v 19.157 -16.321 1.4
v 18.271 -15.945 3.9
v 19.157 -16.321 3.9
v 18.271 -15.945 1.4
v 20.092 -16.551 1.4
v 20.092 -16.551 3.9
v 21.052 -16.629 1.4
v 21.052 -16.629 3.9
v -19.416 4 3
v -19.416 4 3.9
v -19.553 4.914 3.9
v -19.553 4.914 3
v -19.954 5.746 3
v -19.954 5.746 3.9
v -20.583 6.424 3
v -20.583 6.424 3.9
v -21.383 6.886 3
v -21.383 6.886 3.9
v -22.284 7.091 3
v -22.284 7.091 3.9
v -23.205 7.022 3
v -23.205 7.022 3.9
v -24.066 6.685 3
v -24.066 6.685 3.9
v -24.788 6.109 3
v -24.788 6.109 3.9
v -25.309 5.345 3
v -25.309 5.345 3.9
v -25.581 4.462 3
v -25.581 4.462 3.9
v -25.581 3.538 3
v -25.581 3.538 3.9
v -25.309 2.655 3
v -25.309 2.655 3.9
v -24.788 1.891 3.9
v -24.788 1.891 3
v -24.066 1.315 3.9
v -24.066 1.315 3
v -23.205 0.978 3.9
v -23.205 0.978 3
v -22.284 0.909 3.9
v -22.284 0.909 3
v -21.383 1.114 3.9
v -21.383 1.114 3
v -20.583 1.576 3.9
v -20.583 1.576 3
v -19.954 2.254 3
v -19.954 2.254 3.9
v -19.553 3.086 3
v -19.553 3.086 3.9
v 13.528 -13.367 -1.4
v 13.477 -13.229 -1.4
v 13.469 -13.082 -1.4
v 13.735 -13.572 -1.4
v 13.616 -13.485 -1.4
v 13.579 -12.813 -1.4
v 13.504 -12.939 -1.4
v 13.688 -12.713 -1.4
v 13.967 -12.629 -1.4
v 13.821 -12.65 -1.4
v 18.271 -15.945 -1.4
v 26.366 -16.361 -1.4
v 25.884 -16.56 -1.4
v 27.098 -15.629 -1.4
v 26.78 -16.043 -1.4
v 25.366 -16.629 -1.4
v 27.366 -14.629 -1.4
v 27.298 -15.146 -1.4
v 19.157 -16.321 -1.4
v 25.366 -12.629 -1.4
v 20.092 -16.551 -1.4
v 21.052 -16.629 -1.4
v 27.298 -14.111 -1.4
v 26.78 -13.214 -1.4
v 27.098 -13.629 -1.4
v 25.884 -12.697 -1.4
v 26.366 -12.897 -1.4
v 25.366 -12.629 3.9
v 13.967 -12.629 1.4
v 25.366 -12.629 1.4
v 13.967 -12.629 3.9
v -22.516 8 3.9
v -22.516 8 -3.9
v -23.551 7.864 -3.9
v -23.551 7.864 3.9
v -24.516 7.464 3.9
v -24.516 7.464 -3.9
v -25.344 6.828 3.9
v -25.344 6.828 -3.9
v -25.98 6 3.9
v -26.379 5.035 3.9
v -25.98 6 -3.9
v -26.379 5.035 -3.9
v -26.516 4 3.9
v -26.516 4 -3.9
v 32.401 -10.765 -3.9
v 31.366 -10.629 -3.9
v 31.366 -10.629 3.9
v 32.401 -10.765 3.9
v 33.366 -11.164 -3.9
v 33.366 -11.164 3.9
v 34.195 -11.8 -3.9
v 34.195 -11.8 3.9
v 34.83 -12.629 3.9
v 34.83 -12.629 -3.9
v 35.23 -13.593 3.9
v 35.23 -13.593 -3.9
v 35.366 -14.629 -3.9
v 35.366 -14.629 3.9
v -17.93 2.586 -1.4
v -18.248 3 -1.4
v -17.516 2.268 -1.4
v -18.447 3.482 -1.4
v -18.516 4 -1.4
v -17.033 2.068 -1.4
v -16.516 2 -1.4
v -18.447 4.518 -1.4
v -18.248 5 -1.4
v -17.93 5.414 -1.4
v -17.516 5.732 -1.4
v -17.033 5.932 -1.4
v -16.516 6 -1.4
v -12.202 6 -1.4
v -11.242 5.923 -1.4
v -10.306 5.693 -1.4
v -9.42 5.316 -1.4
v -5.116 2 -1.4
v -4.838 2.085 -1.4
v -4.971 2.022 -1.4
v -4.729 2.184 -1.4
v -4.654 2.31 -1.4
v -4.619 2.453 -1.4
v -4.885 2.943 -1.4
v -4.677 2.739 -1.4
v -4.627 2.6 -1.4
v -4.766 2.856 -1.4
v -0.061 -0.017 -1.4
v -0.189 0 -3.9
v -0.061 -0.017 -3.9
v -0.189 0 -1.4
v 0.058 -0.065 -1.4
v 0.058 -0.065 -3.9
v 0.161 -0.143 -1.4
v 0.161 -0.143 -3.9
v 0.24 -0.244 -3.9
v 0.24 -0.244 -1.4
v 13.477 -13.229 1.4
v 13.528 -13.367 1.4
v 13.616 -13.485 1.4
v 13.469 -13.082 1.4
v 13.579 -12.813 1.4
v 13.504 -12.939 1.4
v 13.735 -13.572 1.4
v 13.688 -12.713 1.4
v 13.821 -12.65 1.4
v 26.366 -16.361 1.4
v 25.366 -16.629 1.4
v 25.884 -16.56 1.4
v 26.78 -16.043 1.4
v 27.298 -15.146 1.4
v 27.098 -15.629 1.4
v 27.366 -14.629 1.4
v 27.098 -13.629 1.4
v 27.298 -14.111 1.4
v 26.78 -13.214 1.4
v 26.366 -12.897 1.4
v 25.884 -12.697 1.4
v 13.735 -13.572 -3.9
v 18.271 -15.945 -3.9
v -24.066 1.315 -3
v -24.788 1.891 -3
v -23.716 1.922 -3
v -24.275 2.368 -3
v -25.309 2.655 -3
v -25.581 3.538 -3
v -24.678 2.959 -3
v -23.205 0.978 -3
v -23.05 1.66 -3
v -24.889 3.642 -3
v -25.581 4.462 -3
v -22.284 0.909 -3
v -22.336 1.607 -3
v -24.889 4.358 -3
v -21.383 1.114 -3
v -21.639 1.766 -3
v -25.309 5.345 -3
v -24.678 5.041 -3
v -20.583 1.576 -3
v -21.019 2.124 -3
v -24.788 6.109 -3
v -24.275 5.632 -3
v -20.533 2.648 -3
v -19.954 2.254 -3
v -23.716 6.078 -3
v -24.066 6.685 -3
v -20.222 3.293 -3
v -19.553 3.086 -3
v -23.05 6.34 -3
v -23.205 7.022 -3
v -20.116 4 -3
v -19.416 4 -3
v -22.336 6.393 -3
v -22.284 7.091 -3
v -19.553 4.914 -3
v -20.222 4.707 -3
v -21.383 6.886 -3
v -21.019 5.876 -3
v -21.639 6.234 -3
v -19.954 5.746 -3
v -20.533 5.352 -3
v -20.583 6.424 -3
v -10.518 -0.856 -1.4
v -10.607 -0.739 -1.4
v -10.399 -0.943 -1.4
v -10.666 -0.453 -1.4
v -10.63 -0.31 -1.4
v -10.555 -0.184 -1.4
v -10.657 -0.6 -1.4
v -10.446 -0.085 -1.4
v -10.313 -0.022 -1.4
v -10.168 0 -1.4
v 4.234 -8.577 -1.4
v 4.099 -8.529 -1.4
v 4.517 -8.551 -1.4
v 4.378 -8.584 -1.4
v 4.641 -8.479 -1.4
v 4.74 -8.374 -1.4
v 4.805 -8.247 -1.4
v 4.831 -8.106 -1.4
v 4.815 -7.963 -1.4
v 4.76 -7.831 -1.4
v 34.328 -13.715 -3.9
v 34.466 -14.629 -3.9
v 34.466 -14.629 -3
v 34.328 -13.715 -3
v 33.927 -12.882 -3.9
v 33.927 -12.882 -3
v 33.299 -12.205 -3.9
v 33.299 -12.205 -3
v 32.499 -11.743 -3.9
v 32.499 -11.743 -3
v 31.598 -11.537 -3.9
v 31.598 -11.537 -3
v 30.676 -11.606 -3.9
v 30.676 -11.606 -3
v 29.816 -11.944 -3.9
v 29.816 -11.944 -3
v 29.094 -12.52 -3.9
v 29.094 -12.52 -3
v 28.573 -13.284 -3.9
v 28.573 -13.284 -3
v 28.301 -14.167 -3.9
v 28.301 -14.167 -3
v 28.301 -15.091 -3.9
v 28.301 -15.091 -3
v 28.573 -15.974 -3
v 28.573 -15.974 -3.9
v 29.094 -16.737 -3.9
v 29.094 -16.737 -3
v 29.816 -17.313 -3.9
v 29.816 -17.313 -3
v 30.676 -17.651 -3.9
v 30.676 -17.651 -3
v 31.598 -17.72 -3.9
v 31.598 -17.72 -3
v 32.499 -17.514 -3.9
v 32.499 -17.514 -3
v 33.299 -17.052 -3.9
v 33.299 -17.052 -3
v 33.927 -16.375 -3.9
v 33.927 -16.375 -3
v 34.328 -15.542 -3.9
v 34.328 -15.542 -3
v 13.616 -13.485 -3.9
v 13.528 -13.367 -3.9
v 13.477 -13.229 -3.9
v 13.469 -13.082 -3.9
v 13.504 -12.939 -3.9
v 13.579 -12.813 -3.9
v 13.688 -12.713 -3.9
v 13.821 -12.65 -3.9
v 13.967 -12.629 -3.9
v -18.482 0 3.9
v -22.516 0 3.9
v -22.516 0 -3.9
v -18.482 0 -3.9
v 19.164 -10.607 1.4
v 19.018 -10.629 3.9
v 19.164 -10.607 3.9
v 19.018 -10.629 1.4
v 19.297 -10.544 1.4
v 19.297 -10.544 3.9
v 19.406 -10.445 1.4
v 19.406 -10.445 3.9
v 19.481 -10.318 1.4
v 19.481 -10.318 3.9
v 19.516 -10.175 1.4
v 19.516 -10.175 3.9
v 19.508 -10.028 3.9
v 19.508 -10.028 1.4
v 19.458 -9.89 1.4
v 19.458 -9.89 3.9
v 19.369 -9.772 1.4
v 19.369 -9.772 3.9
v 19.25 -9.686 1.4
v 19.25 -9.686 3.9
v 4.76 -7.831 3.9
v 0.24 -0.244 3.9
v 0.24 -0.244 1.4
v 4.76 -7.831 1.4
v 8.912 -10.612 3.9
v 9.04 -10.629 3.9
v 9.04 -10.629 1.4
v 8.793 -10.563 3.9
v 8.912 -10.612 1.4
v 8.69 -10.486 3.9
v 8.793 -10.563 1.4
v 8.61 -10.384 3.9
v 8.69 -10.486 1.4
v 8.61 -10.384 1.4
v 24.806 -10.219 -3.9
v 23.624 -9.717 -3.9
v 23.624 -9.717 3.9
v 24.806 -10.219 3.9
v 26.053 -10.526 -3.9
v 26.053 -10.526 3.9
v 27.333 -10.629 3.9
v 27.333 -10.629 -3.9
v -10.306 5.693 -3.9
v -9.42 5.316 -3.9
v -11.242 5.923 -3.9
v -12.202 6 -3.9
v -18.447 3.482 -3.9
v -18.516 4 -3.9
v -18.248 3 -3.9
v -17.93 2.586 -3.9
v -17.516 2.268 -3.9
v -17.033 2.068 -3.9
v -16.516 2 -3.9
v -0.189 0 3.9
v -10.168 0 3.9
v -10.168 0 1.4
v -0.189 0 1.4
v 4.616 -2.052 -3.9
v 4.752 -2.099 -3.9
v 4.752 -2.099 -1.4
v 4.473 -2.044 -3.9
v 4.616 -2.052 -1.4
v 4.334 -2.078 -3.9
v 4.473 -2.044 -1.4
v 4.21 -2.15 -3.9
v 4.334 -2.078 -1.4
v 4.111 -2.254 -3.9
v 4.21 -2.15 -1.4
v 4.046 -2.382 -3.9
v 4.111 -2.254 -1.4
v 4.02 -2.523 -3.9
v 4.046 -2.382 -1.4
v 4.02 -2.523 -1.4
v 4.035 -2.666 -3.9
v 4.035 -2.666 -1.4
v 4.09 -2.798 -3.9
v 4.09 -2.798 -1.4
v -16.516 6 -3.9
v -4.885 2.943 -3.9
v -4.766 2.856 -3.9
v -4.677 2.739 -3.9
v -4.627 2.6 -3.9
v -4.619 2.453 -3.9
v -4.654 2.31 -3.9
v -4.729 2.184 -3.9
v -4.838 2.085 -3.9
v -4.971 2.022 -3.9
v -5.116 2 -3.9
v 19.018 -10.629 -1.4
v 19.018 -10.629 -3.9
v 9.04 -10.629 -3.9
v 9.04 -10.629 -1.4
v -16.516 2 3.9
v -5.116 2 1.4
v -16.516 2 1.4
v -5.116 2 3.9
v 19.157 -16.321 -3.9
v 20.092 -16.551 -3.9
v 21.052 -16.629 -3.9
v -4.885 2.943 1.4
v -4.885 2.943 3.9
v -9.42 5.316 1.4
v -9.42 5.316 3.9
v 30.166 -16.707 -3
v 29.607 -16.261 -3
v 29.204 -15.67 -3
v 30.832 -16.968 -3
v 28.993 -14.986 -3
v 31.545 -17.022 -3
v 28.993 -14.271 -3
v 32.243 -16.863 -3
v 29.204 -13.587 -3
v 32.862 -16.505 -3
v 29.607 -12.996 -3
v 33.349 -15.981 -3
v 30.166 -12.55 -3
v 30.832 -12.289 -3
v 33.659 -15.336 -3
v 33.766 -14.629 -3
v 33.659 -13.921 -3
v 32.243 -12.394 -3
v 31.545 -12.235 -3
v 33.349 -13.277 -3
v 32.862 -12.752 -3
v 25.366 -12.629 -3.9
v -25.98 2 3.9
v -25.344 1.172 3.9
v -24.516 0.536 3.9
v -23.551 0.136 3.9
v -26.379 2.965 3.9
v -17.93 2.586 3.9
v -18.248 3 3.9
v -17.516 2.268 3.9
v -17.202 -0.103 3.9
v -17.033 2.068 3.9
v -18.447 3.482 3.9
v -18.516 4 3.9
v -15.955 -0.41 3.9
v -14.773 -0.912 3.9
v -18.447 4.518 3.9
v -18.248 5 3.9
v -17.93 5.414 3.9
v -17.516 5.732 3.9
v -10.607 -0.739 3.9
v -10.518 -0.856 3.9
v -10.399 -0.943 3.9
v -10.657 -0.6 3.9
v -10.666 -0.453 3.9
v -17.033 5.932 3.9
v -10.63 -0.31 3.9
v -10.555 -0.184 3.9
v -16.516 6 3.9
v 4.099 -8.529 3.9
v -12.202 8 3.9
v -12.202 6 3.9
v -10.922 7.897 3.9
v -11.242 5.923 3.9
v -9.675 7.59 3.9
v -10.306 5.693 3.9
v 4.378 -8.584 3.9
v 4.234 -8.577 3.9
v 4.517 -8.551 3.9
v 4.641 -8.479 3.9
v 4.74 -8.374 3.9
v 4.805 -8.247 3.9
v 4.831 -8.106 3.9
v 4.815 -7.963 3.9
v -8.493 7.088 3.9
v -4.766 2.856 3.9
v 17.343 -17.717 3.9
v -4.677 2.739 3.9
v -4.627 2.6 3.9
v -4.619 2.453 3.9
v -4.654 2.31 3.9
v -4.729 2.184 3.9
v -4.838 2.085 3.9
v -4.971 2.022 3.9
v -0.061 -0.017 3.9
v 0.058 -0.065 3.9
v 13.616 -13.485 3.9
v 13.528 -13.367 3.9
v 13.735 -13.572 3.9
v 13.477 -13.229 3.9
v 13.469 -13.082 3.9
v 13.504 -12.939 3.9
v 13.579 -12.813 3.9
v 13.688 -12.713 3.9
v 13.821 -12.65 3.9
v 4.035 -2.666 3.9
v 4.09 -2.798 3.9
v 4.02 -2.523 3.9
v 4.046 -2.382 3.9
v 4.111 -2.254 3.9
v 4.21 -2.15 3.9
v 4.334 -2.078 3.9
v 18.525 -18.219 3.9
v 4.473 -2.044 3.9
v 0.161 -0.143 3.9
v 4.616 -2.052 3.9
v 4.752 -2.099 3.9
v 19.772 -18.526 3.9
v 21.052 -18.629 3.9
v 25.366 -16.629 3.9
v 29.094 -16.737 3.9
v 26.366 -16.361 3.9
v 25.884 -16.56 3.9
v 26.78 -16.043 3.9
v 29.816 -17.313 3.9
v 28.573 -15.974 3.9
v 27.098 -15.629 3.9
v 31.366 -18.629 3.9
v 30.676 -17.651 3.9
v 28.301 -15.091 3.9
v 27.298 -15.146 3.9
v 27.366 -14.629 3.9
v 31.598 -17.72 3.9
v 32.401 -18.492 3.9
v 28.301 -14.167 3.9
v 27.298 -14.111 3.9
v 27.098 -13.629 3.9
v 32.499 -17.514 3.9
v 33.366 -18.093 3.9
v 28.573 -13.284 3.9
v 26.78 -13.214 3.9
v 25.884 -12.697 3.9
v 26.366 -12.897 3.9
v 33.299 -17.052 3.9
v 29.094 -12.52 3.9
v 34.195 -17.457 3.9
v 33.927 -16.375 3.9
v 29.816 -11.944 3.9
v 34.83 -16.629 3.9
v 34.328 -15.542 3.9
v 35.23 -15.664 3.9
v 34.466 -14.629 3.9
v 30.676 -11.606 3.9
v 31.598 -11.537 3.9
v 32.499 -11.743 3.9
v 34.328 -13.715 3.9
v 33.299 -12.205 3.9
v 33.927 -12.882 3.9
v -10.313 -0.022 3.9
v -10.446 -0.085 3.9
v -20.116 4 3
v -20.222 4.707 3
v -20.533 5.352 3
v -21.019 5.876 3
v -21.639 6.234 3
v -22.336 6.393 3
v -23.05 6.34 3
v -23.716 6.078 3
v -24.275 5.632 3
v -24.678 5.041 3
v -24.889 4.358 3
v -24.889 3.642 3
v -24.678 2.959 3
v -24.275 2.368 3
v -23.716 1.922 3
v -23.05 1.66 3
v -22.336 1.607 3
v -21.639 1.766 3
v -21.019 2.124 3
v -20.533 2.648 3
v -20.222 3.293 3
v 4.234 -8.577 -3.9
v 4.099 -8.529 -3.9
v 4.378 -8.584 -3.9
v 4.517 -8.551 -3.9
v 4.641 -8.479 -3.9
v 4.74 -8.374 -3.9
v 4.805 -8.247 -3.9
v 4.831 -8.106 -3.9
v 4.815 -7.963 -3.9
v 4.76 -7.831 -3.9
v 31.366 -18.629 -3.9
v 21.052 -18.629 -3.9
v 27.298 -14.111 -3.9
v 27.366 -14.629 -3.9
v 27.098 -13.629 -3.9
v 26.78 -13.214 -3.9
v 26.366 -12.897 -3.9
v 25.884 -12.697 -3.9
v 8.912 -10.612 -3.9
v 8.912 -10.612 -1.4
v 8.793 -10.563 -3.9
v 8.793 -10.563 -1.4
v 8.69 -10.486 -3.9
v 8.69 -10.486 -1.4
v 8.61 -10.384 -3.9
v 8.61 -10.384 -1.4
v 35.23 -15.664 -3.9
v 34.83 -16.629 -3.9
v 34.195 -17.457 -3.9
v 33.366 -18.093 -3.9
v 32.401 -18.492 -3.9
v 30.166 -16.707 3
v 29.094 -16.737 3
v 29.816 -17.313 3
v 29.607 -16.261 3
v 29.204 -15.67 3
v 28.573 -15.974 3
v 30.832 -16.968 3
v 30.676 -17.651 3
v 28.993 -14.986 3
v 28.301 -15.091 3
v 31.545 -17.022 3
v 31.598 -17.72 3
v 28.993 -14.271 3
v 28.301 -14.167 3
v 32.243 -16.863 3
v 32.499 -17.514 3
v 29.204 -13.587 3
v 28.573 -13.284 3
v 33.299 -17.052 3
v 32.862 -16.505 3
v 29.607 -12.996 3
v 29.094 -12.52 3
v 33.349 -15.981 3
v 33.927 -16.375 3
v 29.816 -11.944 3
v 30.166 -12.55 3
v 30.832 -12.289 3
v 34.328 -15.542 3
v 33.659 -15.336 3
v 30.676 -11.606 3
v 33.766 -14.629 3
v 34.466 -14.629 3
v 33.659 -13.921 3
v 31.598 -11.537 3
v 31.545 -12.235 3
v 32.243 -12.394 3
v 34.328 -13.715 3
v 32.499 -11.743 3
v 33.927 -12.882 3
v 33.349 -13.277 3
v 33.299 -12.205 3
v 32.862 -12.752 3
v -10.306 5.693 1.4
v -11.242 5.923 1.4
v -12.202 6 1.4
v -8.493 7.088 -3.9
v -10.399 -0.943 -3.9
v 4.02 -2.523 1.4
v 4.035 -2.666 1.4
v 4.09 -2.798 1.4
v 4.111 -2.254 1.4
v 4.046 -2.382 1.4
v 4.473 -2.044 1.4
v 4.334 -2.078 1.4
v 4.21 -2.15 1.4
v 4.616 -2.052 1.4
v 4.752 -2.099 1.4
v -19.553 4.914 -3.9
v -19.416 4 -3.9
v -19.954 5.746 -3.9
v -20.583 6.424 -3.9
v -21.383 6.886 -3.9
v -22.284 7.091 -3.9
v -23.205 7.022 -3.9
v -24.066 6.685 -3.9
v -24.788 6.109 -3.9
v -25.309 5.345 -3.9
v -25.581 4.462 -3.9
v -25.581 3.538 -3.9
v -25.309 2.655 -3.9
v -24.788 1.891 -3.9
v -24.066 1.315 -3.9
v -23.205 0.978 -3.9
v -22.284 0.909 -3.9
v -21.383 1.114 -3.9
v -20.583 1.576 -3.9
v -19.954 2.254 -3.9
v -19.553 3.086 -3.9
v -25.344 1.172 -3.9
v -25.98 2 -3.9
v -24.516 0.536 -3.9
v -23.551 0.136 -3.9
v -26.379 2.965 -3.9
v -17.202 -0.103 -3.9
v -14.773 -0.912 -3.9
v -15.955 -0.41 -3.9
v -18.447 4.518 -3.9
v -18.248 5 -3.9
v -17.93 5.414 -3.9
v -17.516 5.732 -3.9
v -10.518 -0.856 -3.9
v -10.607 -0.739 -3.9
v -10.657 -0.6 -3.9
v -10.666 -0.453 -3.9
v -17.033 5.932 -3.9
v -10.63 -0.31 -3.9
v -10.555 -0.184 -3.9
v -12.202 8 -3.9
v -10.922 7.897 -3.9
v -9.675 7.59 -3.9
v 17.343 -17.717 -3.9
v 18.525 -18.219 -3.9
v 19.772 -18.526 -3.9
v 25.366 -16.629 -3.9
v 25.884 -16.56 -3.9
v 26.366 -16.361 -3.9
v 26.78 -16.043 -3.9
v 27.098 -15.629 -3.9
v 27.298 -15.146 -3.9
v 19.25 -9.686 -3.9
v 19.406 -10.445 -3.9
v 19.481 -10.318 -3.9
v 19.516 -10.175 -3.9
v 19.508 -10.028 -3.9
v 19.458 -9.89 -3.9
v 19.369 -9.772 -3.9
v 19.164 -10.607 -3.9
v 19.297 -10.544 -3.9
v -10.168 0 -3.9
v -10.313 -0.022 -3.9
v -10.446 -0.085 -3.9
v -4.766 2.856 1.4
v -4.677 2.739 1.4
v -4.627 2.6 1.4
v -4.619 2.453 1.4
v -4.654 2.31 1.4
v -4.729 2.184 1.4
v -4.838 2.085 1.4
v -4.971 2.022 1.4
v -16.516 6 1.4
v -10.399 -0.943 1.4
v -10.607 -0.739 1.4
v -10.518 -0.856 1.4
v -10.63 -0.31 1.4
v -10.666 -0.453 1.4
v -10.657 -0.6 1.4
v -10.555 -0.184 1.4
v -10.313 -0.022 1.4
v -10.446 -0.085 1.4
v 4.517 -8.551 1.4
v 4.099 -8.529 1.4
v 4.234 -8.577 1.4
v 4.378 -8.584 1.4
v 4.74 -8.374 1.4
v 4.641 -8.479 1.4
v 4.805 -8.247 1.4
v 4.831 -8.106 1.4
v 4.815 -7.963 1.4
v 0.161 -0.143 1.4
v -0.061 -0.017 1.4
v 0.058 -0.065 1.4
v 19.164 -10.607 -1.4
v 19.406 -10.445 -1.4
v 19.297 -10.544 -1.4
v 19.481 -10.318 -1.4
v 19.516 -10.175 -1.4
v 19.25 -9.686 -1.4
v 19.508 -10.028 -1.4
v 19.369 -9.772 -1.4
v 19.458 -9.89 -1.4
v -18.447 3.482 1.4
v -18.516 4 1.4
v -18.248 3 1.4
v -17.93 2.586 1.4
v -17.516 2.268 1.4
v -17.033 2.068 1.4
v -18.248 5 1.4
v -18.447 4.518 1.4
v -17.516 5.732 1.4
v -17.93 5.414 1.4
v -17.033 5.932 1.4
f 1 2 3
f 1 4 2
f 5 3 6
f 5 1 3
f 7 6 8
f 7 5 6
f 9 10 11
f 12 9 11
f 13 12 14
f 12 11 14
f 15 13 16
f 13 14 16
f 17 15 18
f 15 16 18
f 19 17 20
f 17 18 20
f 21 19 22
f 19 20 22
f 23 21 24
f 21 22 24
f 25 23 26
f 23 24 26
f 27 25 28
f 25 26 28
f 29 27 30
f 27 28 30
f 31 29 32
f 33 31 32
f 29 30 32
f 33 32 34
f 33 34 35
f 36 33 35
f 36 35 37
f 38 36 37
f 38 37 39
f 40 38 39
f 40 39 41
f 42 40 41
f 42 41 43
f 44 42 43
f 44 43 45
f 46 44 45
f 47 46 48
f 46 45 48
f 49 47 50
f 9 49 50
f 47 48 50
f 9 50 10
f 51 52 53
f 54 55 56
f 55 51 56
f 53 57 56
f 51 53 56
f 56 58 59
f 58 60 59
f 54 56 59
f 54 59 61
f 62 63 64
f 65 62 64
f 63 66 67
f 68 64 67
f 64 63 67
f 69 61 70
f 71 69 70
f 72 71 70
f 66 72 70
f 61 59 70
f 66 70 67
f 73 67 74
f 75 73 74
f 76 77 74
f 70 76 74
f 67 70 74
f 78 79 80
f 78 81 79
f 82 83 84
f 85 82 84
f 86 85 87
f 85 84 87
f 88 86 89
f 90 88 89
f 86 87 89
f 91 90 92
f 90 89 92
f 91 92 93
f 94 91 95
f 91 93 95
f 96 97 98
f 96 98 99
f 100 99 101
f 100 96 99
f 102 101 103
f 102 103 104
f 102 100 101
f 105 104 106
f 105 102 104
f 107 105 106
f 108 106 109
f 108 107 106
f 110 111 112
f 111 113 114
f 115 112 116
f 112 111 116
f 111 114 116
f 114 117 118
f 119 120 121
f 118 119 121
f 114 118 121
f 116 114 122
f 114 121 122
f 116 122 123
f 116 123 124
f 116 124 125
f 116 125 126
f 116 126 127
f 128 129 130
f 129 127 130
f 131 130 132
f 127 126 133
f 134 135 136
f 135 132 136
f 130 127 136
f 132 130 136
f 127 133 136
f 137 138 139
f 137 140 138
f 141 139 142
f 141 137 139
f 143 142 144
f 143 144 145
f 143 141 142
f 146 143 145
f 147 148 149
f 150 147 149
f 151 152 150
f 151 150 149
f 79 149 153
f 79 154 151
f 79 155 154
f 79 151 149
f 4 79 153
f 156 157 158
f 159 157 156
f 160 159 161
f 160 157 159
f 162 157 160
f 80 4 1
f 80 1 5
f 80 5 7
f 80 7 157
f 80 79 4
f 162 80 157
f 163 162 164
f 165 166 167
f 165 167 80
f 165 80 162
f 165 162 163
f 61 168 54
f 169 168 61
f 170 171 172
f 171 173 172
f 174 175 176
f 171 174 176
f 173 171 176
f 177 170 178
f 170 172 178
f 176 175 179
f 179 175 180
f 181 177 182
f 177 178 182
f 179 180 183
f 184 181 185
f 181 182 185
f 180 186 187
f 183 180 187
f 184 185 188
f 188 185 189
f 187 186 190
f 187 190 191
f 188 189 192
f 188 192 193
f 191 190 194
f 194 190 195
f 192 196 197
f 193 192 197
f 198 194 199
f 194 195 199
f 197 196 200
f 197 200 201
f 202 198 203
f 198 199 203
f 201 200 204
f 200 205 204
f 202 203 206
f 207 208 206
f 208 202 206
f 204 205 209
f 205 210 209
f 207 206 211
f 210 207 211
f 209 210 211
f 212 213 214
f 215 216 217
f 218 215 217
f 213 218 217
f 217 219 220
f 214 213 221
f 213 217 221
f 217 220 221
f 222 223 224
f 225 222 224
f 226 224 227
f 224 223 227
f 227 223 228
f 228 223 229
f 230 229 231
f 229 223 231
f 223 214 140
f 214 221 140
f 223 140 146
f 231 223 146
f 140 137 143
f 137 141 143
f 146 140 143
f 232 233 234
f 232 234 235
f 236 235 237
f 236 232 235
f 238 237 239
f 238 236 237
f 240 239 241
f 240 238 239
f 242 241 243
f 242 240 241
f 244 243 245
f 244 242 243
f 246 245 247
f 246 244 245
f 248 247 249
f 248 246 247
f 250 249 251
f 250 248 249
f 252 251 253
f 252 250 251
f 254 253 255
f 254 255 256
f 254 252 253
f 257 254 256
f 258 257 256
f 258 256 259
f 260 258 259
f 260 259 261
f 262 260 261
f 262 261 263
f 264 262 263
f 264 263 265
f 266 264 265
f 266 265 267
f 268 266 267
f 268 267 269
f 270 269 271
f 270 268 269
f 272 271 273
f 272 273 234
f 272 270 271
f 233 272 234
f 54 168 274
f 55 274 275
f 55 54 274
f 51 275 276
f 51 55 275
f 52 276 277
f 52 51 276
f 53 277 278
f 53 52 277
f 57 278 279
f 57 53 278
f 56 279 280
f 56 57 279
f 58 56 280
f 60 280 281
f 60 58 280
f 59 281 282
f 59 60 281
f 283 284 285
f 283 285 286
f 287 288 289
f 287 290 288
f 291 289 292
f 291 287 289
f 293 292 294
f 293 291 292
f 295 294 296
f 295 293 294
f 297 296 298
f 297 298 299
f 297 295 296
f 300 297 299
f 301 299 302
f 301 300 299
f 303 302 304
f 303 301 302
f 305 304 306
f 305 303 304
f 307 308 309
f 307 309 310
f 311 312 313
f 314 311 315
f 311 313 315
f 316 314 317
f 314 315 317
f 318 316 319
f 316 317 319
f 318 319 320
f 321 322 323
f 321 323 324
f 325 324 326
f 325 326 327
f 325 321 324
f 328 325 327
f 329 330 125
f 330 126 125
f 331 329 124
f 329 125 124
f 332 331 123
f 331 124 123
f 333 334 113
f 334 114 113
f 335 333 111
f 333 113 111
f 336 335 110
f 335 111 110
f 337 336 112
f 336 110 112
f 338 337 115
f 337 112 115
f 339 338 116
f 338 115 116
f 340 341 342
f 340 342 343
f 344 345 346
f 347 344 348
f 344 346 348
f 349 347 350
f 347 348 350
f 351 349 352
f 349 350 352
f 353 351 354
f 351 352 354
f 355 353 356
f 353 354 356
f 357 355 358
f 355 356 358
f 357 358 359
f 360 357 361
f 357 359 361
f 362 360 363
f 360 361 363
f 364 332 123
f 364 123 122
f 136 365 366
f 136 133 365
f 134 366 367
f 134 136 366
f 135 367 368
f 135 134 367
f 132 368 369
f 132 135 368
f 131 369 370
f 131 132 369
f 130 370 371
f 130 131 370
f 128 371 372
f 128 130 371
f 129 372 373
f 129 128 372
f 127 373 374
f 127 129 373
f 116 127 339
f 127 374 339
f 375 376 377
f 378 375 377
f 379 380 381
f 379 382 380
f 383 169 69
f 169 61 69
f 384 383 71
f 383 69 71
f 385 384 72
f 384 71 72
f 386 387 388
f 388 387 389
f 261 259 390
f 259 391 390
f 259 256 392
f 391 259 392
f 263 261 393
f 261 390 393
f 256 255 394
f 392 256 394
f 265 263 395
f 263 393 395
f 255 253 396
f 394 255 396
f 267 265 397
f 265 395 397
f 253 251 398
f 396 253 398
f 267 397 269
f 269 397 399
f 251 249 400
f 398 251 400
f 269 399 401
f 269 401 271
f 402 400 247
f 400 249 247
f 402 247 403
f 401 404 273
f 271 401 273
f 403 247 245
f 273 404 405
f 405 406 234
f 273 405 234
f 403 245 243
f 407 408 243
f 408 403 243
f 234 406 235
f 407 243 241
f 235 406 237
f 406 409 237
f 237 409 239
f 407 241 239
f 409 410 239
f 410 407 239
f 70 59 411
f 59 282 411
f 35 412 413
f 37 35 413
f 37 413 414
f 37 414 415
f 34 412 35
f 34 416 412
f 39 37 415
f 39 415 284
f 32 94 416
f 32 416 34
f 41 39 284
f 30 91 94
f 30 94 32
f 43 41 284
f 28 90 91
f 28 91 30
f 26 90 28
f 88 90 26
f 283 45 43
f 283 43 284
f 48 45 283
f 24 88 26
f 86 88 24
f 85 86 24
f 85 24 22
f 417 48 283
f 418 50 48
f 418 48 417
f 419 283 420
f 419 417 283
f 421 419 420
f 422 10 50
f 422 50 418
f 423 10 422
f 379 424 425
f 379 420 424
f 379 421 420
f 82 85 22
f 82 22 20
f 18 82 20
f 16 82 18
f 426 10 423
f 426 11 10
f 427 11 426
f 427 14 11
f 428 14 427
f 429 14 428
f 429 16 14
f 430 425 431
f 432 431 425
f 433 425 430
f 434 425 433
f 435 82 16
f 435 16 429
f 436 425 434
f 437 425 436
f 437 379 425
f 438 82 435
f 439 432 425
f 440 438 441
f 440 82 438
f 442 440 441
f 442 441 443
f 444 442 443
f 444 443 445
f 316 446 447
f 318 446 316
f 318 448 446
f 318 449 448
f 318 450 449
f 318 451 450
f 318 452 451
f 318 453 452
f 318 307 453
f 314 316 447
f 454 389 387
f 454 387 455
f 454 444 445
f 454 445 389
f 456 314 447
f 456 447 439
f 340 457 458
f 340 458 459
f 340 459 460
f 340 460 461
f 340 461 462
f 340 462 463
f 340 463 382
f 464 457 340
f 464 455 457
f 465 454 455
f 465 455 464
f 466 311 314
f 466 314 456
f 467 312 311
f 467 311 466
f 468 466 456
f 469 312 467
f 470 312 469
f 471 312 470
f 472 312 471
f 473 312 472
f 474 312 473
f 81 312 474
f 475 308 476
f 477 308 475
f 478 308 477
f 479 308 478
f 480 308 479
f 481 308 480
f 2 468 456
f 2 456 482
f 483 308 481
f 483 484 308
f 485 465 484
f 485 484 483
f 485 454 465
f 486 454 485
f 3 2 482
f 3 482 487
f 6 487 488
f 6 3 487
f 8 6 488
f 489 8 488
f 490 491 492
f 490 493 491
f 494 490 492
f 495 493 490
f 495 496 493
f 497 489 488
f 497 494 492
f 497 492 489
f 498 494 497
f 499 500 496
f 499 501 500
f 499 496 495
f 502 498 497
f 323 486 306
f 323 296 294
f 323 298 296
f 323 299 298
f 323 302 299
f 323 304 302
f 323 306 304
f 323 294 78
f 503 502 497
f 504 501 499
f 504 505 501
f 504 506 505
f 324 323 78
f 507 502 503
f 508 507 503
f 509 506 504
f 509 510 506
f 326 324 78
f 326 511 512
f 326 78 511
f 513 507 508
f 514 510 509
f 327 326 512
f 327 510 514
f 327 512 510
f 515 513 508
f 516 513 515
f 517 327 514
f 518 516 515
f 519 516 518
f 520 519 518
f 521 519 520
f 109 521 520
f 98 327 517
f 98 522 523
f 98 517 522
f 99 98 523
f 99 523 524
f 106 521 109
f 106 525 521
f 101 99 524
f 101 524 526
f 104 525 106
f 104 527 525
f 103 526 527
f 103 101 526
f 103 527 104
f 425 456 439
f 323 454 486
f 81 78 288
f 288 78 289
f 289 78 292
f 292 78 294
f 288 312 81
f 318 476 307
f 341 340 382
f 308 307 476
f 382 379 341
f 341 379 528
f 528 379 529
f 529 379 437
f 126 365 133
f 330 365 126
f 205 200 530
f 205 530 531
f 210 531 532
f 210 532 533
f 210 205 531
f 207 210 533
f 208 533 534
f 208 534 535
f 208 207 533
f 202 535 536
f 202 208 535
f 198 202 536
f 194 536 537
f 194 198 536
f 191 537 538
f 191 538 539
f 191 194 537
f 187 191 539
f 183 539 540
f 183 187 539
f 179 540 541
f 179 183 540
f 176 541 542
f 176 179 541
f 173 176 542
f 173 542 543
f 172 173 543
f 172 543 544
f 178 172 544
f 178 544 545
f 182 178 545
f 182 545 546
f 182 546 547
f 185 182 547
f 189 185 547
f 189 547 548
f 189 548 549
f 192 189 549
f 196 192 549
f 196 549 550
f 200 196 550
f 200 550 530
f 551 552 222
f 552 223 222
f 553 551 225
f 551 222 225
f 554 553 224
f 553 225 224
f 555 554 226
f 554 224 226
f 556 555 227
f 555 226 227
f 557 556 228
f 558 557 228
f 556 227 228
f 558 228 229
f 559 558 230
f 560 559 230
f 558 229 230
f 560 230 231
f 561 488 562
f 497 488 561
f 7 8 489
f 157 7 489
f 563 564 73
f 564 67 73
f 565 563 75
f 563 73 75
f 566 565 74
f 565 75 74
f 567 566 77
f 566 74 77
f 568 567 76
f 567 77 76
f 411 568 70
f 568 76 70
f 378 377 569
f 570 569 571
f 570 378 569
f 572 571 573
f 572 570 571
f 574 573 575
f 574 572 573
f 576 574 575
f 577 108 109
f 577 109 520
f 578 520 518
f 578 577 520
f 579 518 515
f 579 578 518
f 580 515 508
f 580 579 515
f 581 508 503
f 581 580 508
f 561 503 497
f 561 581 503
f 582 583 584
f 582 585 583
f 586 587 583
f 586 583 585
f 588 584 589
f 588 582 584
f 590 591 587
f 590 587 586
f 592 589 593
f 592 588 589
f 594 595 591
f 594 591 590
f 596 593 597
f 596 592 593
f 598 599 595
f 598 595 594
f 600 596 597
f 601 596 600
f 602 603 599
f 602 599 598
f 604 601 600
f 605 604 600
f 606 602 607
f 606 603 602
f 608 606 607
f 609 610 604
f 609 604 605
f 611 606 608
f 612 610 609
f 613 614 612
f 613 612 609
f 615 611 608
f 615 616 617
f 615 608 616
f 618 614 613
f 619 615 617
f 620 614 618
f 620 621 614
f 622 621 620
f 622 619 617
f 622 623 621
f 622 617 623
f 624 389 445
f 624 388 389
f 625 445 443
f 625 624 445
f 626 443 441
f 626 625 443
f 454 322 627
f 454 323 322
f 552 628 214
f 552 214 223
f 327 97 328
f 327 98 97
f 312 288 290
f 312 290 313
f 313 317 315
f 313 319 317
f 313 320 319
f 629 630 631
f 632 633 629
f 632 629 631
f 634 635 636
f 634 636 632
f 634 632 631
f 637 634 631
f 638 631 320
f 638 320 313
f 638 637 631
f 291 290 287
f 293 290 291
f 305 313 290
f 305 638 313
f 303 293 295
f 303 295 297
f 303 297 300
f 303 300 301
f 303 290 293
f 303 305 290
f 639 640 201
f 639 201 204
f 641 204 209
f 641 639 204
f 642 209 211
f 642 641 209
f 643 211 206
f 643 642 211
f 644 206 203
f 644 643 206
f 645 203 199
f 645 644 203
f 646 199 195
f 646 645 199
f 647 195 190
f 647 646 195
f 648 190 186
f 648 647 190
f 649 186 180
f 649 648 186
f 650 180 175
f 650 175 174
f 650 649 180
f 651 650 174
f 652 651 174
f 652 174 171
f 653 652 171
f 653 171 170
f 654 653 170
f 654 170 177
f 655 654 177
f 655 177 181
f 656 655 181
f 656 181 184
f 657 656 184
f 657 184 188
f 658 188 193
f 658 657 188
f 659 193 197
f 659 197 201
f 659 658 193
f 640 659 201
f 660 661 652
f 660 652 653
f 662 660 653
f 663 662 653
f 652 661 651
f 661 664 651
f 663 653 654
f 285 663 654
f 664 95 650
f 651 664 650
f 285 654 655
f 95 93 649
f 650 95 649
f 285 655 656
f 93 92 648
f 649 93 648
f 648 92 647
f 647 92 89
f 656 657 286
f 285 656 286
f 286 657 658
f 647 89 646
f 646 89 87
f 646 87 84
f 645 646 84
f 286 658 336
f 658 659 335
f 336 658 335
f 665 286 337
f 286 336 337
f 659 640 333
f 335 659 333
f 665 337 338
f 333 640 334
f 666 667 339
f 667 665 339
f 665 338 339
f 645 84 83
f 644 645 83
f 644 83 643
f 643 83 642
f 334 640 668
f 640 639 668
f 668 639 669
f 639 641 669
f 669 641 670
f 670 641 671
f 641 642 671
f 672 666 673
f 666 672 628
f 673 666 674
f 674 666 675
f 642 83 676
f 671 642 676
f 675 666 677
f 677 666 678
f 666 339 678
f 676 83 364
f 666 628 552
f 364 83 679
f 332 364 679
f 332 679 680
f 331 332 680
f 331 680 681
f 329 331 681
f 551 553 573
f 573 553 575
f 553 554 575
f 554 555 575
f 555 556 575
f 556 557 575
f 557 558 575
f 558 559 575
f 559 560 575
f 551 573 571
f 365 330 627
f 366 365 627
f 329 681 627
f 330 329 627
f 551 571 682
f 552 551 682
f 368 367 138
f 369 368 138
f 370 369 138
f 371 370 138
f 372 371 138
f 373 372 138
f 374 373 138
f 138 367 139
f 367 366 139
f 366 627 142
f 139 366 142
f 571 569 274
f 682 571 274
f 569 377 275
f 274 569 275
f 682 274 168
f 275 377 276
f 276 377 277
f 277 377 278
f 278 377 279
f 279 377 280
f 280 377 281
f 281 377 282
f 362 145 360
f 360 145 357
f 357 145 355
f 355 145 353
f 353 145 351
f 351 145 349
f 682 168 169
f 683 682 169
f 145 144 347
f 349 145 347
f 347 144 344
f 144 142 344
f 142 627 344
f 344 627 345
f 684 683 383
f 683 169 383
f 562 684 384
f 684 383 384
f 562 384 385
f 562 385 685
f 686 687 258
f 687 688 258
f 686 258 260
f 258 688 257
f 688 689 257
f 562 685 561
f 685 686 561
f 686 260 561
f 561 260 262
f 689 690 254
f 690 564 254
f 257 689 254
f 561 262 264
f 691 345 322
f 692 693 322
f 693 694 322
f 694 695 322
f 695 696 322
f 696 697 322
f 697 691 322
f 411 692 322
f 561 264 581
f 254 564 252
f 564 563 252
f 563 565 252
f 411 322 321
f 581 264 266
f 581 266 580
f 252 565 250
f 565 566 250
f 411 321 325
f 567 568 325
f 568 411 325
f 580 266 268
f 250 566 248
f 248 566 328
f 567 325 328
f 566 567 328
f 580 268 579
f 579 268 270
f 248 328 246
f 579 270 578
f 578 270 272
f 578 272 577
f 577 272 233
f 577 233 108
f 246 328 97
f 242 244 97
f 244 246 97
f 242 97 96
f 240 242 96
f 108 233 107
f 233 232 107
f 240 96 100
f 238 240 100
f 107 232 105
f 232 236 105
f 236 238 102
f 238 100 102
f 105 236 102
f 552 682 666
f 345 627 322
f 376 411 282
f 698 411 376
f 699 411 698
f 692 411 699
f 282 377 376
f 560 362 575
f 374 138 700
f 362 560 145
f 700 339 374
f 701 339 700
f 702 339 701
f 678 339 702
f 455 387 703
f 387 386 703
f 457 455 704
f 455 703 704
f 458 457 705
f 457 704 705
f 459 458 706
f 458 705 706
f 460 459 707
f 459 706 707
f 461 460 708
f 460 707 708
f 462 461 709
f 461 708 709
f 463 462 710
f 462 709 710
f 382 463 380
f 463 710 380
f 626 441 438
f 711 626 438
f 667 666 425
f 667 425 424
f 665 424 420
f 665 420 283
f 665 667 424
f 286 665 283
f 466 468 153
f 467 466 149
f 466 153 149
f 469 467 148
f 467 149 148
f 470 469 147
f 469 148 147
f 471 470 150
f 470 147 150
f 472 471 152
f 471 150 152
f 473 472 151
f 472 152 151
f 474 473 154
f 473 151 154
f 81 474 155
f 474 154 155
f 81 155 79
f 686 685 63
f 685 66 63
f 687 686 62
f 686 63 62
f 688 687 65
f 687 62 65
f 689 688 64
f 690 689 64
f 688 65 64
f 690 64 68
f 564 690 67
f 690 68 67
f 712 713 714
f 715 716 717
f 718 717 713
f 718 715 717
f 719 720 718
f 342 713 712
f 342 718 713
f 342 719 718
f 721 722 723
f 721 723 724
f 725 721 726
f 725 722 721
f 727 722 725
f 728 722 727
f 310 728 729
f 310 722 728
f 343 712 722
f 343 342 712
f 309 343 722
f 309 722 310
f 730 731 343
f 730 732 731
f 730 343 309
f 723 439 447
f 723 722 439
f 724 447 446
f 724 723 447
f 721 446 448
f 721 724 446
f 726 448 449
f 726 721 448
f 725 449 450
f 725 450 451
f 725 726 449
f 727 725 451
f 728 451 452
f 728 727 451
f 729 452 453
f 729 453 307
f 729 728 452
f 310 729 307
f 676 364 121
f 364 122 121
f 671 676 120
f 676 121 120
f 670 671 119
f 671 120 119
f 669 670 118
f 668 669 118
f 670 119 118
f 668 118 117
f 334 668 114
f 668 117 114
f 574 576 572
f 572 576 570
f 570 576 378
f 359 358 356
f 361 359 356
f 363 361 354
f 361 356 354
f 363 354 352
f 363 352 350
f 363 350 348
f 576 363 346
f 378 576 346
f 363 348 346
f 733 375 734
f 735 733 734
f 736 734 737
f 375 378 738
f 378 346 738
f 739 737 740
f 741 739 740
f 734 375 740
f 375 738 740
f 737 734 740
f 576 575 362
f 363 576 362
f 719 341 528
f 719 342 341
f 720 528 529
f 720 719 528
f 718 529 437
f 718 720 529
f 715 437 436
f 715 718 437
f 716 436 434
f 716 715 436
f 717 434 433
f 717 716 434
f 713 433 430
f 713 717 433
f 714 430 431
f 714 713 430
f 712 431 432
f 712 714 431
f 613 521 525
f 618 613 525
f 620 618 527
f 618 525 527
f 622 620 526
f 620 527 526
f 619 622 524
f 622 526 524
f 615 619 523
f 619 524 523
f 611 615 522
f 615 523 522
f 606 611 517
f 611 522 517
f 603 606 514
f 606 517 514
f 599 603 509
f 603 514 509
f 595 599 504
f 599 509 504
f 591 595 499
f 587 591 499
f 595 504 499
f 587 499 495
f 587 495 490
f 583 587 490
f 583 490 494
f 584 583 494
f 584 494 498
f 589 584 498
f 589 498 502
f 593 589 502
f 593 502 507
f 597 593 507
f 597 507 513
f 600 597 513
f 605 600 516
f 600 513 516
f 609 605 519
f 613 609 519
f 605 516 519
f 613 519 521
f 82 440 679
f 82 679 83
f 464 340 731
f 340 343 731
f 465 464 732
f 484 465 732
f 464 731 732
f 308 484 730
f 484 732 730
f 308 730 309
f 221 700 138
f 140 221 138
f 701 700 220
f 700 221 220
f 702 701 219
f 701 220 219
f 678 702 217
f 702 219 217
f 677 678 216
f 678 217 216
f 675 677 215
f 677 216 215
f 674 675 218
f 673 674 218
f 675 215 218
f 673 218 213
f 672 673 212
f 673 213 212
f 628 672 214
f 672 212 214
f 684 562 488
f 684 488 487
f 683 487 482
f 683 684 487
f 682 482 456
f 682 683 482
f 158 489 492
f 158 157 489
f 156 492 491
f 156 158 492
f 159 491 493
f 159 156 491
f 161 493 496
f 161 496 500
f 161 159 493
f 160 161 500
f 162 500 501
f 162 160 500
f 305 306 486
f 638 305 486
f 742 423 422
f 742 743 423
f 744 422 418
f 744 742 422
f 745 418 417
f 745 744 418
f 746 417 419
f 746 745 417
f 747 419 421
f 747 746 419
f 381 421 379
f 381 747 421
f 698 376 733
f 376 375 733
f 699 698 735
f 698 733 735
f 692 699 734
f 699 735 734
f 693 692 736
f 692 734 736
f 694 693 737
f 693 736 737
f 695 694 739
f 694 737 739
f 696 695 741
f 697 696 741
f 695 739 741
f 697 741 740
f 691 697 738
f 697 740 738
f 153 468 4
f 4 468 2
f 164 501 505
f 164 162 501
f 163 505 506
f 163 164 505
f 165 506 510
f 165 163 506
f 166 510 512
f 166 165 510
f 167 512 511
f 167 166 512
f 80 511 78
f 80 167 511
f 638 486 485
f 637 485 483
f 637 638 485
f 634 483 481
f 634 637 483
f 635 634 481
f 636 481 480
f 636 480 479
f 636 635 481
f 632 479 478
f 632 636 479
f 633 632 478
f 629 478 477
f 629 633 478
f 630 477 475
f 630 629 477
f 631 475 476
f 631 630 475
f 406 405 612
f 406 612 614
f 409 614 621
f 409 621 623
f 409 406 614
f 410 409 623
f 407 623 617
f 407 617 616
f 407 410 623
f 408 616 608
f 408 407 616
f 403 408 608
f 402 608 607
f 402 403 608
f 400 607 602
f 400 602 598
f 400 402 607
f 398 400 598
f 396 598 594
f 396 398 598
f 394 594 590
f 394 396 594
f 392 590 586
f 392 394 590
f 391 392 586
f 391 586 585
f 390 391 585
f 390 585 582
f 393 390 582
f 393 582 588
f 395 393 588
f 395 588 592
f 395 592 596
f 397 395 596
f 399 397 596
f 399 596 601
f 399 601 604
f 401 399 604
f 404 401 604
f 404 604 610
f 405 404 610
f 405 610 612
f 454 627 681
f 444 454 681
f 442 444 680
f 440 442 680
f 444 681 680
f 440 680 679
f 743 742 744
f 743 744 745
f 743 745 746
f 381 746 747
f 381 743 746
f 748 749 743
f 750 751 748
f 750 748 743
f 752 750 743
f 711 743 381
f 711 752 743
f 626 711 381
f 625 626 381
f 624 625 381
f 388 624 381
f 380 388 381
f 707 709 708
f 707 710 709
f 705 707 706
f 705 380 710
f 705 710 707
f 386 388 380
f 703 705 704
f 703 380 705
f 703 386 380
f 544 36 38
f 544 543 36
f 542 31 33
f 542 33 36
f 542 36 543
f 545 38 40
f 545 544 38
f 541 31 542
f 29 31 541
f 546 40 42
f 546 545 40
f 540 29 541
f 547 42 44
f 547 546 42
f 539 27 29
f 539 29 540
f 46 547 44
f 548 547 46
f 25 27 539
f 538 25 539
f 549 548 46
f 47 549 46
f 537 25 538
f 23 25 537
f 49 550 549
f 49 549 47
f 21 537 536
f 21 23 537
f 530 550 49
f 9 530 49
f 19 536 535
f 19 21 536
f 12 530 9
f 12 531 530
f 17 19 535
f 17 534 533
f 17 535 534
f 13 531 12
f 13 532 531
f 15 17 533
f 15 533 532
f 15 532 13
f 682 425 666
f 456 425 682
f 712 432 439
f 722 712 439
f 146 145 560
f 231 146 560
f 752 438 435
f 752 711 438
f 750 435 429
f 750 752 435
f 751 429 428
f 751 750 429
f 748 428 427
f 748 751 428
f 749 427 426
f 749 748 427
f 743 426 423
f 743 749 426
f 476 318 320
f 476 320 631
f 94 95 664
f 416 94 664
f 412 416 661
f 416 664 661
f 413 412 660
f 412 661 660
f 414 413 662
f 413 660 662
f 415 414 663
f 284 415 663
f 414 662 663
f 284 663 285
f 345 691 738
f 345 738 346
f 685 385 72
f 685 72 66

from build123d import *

# Parameters (mm, degrees)
F1_DEPTH  = 3.9
F3_DEPTH  = 2.5
F5_DEPTH  = 2.5
F6_R      = 8
F7_R      = 3.99999
F8_R      = 2.4
F9_DEPTH  = 3.901
F8_R_2    = 3.1
F10_DEPTH = 0.9
F12_R     = 1.99999
F13_R     = 6
F14_R     = 0.5


# Not quite as in the source:
# - a fillet or chamfer is up to 0.001 mm smaller than in the source, because OpenCascade refuses the exact size


with BuildPart() as f1:
    # F0 (on Top) → F1 (new body)
    with BuildSketch(Plane.XY):
        Polygon((-10.2351482974, 8), (-26.5155562797, 8), (-26.5155562797, 0), (-16.5155562797, 0), (19.0857153862, -18.6285724837), (35.3661233686, -18.6285724837), (35.3661233686, -10.6285724837), (25.3661233686, -10.6285724837), align=None)
    extrude(amount=F1_DEPTH)

    # F2 (on face) → F3 (cut)
    with BuildSketch(Plane.XY.offset(3.9)):
        Polygon((24.8744862124, -12.6285724837), (-10.7267854535, 6), (-18.5155562797, 6), (-18.5155562797, 2), (-16.0239191236, 2), (19.5773525424, -16.6285724837), (27.3661233686, -16.6285724837), (27.3661233686, -12.6285724837), align=None)
    extrude(amount=-F3_DEPTH, mode=Mode.SUBTRACT)

    # F4 (on face) → F5 (join, through all)
    with BuildSketch(Plane.XY.offset(3.9)):
        Polygon((11.9329081391, -12.6285724837), (24.8744862124, -12.6285724837), (21.0522640108, -10.6285724837), (8.7555263004, -10.6285724837), (3.1855427267, -1.2797066451), (0.7398811514, 0), (0.0950407885, 0), (5.6650243622, -9.3488658386), align=None)
        Polygon((-12.201696922, 0), (0.0950407885, 0), (-0.1970488953, 0.4902540968), (-3.0823410503, 2), (-16.0239191236, 2), align=None)
        Polygon((-0.1970488953, 0.4902540968), (0.0950407885, 0), (0.7398811514, 0), align=None)
    extrude(amount=-F5_DEPTH)

    # F6
    f6_edges = [f1.edges().sort_by_distance(p)[0] for p in [
        (-10.235148, 8, 1.95),
        (25.366123, -10.628572, 1.95),
        (19.085715, -18.628572, 1.95),
        (-16.515556, 0, 1.95),
    ]]
    fillet(f6_edges, radius=F6_R)

    # F7 (radius 4 in the source; OpenCascade refuses exactly that, so slightly less here)
    f7_edges = [f1.edges().sort_by_distance(p)[0] for p in [
        (-26.515556, 8, 1.95),
        (-26.515556, 0, 1.95),
        (35.366123, -10.628572, 1.95),
        (35.366123, -18.628572, 1.95),
    ]]
    fillet(f7_edges, radius=F7_R)

    # F8 (on face) → F9 (cut, through all)
    with BuildSketch(Plane.XY.offset(3.9)):
        with Locations((-22.5155562797, 4)):
            Circle(F8_R)
        with Locations((31.3661233686, -14.6285724837)):
            Circle(F8_R)
    extrude(amount=-F9_DEPTH, mode=Mode.SUBTRACT)

    # F8 (on face) → F10 (cut)
    with BuildSketch(Plane.XY.offset(3.9)):
        with Locations((-22.5155562797, 4)):
            Circle(F8_R_2)
        with Locations((-22.5155562797, 4)):
            Circle(F8_R, mode=Mode.SUBTRACT)
        with Locations((31.3661233686, -14.6285724837)):
            Circle(F8_R_2)
        with Locations((31.3661233686, -14.6285724837)):
            Circle(F8_R, mode=Mode.SUBTRACT)
    extrude(amount=-F10_DEPTH, mode=Mode.SUBTRACT)

    # F11: F1 across face


with BuildPart() as f1_1:
    add(f1.part)
    add(f1.part.mirror(Plane(origin=(4.4252835444, -5.3142862419, 0), x_dir=(1, 0, 0), z_dir=(0, 0, -1))))

    # F12 (radius 2 in the source; OpenCascade refuses exactly that, so slightly less here)
    f12_edges = [f1_1.edges().sort_by_distance(p)[0] for p in [
        (27.366123, -16.628572, 2.65),
        (27.366123, -12.628572, 2.65),
        (-18.515556, 2, 2.65),
        (-18.515556, 6, 2.65),
        (-18.515556, 2, -2.65),
        (-18.515556, 6, -2.65),
        (27.366123, -16.628572, -2.65),
        (27.366123, -12.628572, -2.65),
    ]]
    fillet(f12_edges, radius=F12_R)

    # F13
    f13_edges = [f1_1.edges().sort_by_distance(p)[0] for p in [
        (19.577353, -16.628572, -2.65),
        (-10.726785, 6, -2.65),
        (-10.726785, 6, 2.65),
        (19.577353, -16.628572, 2.65),
    ]]
    fillet(f13_edges, radius=F13_R)

    # F14
    f14_edges = [f1_1.edges().sort_by_distance(p)[0] for p in [
        (8.755526, -10.628572, 2.65),
        (21.052264, -10.628572, 2.65),
        (3.185543, -1.279707, 2.65),
        (11.932908, -12.628572, 2.65),
        (-12.201697, 0, 2.65),
        (0.095041, 0, 2.65),
        (5.665024, -9.348866, 2.65),
        (-3.082341, 2, 2.65),
        (-3.082341, 2, -2.65),
        (21.052264, -10.628572, -2.65),
        (-12.201697, 0, -2.65),
        (11.932908, -12.628572, -2.65),
        (8.755526, -10.628572, -2.65),
        (3.185543, -1.279707, -2.65),
        (0.095041, 0, -2.65),
        (5.665024, -9.348866, -2.65),
    ]]
    fillet(f14_edges, radius=F14_R)


solid = f1_1.part
